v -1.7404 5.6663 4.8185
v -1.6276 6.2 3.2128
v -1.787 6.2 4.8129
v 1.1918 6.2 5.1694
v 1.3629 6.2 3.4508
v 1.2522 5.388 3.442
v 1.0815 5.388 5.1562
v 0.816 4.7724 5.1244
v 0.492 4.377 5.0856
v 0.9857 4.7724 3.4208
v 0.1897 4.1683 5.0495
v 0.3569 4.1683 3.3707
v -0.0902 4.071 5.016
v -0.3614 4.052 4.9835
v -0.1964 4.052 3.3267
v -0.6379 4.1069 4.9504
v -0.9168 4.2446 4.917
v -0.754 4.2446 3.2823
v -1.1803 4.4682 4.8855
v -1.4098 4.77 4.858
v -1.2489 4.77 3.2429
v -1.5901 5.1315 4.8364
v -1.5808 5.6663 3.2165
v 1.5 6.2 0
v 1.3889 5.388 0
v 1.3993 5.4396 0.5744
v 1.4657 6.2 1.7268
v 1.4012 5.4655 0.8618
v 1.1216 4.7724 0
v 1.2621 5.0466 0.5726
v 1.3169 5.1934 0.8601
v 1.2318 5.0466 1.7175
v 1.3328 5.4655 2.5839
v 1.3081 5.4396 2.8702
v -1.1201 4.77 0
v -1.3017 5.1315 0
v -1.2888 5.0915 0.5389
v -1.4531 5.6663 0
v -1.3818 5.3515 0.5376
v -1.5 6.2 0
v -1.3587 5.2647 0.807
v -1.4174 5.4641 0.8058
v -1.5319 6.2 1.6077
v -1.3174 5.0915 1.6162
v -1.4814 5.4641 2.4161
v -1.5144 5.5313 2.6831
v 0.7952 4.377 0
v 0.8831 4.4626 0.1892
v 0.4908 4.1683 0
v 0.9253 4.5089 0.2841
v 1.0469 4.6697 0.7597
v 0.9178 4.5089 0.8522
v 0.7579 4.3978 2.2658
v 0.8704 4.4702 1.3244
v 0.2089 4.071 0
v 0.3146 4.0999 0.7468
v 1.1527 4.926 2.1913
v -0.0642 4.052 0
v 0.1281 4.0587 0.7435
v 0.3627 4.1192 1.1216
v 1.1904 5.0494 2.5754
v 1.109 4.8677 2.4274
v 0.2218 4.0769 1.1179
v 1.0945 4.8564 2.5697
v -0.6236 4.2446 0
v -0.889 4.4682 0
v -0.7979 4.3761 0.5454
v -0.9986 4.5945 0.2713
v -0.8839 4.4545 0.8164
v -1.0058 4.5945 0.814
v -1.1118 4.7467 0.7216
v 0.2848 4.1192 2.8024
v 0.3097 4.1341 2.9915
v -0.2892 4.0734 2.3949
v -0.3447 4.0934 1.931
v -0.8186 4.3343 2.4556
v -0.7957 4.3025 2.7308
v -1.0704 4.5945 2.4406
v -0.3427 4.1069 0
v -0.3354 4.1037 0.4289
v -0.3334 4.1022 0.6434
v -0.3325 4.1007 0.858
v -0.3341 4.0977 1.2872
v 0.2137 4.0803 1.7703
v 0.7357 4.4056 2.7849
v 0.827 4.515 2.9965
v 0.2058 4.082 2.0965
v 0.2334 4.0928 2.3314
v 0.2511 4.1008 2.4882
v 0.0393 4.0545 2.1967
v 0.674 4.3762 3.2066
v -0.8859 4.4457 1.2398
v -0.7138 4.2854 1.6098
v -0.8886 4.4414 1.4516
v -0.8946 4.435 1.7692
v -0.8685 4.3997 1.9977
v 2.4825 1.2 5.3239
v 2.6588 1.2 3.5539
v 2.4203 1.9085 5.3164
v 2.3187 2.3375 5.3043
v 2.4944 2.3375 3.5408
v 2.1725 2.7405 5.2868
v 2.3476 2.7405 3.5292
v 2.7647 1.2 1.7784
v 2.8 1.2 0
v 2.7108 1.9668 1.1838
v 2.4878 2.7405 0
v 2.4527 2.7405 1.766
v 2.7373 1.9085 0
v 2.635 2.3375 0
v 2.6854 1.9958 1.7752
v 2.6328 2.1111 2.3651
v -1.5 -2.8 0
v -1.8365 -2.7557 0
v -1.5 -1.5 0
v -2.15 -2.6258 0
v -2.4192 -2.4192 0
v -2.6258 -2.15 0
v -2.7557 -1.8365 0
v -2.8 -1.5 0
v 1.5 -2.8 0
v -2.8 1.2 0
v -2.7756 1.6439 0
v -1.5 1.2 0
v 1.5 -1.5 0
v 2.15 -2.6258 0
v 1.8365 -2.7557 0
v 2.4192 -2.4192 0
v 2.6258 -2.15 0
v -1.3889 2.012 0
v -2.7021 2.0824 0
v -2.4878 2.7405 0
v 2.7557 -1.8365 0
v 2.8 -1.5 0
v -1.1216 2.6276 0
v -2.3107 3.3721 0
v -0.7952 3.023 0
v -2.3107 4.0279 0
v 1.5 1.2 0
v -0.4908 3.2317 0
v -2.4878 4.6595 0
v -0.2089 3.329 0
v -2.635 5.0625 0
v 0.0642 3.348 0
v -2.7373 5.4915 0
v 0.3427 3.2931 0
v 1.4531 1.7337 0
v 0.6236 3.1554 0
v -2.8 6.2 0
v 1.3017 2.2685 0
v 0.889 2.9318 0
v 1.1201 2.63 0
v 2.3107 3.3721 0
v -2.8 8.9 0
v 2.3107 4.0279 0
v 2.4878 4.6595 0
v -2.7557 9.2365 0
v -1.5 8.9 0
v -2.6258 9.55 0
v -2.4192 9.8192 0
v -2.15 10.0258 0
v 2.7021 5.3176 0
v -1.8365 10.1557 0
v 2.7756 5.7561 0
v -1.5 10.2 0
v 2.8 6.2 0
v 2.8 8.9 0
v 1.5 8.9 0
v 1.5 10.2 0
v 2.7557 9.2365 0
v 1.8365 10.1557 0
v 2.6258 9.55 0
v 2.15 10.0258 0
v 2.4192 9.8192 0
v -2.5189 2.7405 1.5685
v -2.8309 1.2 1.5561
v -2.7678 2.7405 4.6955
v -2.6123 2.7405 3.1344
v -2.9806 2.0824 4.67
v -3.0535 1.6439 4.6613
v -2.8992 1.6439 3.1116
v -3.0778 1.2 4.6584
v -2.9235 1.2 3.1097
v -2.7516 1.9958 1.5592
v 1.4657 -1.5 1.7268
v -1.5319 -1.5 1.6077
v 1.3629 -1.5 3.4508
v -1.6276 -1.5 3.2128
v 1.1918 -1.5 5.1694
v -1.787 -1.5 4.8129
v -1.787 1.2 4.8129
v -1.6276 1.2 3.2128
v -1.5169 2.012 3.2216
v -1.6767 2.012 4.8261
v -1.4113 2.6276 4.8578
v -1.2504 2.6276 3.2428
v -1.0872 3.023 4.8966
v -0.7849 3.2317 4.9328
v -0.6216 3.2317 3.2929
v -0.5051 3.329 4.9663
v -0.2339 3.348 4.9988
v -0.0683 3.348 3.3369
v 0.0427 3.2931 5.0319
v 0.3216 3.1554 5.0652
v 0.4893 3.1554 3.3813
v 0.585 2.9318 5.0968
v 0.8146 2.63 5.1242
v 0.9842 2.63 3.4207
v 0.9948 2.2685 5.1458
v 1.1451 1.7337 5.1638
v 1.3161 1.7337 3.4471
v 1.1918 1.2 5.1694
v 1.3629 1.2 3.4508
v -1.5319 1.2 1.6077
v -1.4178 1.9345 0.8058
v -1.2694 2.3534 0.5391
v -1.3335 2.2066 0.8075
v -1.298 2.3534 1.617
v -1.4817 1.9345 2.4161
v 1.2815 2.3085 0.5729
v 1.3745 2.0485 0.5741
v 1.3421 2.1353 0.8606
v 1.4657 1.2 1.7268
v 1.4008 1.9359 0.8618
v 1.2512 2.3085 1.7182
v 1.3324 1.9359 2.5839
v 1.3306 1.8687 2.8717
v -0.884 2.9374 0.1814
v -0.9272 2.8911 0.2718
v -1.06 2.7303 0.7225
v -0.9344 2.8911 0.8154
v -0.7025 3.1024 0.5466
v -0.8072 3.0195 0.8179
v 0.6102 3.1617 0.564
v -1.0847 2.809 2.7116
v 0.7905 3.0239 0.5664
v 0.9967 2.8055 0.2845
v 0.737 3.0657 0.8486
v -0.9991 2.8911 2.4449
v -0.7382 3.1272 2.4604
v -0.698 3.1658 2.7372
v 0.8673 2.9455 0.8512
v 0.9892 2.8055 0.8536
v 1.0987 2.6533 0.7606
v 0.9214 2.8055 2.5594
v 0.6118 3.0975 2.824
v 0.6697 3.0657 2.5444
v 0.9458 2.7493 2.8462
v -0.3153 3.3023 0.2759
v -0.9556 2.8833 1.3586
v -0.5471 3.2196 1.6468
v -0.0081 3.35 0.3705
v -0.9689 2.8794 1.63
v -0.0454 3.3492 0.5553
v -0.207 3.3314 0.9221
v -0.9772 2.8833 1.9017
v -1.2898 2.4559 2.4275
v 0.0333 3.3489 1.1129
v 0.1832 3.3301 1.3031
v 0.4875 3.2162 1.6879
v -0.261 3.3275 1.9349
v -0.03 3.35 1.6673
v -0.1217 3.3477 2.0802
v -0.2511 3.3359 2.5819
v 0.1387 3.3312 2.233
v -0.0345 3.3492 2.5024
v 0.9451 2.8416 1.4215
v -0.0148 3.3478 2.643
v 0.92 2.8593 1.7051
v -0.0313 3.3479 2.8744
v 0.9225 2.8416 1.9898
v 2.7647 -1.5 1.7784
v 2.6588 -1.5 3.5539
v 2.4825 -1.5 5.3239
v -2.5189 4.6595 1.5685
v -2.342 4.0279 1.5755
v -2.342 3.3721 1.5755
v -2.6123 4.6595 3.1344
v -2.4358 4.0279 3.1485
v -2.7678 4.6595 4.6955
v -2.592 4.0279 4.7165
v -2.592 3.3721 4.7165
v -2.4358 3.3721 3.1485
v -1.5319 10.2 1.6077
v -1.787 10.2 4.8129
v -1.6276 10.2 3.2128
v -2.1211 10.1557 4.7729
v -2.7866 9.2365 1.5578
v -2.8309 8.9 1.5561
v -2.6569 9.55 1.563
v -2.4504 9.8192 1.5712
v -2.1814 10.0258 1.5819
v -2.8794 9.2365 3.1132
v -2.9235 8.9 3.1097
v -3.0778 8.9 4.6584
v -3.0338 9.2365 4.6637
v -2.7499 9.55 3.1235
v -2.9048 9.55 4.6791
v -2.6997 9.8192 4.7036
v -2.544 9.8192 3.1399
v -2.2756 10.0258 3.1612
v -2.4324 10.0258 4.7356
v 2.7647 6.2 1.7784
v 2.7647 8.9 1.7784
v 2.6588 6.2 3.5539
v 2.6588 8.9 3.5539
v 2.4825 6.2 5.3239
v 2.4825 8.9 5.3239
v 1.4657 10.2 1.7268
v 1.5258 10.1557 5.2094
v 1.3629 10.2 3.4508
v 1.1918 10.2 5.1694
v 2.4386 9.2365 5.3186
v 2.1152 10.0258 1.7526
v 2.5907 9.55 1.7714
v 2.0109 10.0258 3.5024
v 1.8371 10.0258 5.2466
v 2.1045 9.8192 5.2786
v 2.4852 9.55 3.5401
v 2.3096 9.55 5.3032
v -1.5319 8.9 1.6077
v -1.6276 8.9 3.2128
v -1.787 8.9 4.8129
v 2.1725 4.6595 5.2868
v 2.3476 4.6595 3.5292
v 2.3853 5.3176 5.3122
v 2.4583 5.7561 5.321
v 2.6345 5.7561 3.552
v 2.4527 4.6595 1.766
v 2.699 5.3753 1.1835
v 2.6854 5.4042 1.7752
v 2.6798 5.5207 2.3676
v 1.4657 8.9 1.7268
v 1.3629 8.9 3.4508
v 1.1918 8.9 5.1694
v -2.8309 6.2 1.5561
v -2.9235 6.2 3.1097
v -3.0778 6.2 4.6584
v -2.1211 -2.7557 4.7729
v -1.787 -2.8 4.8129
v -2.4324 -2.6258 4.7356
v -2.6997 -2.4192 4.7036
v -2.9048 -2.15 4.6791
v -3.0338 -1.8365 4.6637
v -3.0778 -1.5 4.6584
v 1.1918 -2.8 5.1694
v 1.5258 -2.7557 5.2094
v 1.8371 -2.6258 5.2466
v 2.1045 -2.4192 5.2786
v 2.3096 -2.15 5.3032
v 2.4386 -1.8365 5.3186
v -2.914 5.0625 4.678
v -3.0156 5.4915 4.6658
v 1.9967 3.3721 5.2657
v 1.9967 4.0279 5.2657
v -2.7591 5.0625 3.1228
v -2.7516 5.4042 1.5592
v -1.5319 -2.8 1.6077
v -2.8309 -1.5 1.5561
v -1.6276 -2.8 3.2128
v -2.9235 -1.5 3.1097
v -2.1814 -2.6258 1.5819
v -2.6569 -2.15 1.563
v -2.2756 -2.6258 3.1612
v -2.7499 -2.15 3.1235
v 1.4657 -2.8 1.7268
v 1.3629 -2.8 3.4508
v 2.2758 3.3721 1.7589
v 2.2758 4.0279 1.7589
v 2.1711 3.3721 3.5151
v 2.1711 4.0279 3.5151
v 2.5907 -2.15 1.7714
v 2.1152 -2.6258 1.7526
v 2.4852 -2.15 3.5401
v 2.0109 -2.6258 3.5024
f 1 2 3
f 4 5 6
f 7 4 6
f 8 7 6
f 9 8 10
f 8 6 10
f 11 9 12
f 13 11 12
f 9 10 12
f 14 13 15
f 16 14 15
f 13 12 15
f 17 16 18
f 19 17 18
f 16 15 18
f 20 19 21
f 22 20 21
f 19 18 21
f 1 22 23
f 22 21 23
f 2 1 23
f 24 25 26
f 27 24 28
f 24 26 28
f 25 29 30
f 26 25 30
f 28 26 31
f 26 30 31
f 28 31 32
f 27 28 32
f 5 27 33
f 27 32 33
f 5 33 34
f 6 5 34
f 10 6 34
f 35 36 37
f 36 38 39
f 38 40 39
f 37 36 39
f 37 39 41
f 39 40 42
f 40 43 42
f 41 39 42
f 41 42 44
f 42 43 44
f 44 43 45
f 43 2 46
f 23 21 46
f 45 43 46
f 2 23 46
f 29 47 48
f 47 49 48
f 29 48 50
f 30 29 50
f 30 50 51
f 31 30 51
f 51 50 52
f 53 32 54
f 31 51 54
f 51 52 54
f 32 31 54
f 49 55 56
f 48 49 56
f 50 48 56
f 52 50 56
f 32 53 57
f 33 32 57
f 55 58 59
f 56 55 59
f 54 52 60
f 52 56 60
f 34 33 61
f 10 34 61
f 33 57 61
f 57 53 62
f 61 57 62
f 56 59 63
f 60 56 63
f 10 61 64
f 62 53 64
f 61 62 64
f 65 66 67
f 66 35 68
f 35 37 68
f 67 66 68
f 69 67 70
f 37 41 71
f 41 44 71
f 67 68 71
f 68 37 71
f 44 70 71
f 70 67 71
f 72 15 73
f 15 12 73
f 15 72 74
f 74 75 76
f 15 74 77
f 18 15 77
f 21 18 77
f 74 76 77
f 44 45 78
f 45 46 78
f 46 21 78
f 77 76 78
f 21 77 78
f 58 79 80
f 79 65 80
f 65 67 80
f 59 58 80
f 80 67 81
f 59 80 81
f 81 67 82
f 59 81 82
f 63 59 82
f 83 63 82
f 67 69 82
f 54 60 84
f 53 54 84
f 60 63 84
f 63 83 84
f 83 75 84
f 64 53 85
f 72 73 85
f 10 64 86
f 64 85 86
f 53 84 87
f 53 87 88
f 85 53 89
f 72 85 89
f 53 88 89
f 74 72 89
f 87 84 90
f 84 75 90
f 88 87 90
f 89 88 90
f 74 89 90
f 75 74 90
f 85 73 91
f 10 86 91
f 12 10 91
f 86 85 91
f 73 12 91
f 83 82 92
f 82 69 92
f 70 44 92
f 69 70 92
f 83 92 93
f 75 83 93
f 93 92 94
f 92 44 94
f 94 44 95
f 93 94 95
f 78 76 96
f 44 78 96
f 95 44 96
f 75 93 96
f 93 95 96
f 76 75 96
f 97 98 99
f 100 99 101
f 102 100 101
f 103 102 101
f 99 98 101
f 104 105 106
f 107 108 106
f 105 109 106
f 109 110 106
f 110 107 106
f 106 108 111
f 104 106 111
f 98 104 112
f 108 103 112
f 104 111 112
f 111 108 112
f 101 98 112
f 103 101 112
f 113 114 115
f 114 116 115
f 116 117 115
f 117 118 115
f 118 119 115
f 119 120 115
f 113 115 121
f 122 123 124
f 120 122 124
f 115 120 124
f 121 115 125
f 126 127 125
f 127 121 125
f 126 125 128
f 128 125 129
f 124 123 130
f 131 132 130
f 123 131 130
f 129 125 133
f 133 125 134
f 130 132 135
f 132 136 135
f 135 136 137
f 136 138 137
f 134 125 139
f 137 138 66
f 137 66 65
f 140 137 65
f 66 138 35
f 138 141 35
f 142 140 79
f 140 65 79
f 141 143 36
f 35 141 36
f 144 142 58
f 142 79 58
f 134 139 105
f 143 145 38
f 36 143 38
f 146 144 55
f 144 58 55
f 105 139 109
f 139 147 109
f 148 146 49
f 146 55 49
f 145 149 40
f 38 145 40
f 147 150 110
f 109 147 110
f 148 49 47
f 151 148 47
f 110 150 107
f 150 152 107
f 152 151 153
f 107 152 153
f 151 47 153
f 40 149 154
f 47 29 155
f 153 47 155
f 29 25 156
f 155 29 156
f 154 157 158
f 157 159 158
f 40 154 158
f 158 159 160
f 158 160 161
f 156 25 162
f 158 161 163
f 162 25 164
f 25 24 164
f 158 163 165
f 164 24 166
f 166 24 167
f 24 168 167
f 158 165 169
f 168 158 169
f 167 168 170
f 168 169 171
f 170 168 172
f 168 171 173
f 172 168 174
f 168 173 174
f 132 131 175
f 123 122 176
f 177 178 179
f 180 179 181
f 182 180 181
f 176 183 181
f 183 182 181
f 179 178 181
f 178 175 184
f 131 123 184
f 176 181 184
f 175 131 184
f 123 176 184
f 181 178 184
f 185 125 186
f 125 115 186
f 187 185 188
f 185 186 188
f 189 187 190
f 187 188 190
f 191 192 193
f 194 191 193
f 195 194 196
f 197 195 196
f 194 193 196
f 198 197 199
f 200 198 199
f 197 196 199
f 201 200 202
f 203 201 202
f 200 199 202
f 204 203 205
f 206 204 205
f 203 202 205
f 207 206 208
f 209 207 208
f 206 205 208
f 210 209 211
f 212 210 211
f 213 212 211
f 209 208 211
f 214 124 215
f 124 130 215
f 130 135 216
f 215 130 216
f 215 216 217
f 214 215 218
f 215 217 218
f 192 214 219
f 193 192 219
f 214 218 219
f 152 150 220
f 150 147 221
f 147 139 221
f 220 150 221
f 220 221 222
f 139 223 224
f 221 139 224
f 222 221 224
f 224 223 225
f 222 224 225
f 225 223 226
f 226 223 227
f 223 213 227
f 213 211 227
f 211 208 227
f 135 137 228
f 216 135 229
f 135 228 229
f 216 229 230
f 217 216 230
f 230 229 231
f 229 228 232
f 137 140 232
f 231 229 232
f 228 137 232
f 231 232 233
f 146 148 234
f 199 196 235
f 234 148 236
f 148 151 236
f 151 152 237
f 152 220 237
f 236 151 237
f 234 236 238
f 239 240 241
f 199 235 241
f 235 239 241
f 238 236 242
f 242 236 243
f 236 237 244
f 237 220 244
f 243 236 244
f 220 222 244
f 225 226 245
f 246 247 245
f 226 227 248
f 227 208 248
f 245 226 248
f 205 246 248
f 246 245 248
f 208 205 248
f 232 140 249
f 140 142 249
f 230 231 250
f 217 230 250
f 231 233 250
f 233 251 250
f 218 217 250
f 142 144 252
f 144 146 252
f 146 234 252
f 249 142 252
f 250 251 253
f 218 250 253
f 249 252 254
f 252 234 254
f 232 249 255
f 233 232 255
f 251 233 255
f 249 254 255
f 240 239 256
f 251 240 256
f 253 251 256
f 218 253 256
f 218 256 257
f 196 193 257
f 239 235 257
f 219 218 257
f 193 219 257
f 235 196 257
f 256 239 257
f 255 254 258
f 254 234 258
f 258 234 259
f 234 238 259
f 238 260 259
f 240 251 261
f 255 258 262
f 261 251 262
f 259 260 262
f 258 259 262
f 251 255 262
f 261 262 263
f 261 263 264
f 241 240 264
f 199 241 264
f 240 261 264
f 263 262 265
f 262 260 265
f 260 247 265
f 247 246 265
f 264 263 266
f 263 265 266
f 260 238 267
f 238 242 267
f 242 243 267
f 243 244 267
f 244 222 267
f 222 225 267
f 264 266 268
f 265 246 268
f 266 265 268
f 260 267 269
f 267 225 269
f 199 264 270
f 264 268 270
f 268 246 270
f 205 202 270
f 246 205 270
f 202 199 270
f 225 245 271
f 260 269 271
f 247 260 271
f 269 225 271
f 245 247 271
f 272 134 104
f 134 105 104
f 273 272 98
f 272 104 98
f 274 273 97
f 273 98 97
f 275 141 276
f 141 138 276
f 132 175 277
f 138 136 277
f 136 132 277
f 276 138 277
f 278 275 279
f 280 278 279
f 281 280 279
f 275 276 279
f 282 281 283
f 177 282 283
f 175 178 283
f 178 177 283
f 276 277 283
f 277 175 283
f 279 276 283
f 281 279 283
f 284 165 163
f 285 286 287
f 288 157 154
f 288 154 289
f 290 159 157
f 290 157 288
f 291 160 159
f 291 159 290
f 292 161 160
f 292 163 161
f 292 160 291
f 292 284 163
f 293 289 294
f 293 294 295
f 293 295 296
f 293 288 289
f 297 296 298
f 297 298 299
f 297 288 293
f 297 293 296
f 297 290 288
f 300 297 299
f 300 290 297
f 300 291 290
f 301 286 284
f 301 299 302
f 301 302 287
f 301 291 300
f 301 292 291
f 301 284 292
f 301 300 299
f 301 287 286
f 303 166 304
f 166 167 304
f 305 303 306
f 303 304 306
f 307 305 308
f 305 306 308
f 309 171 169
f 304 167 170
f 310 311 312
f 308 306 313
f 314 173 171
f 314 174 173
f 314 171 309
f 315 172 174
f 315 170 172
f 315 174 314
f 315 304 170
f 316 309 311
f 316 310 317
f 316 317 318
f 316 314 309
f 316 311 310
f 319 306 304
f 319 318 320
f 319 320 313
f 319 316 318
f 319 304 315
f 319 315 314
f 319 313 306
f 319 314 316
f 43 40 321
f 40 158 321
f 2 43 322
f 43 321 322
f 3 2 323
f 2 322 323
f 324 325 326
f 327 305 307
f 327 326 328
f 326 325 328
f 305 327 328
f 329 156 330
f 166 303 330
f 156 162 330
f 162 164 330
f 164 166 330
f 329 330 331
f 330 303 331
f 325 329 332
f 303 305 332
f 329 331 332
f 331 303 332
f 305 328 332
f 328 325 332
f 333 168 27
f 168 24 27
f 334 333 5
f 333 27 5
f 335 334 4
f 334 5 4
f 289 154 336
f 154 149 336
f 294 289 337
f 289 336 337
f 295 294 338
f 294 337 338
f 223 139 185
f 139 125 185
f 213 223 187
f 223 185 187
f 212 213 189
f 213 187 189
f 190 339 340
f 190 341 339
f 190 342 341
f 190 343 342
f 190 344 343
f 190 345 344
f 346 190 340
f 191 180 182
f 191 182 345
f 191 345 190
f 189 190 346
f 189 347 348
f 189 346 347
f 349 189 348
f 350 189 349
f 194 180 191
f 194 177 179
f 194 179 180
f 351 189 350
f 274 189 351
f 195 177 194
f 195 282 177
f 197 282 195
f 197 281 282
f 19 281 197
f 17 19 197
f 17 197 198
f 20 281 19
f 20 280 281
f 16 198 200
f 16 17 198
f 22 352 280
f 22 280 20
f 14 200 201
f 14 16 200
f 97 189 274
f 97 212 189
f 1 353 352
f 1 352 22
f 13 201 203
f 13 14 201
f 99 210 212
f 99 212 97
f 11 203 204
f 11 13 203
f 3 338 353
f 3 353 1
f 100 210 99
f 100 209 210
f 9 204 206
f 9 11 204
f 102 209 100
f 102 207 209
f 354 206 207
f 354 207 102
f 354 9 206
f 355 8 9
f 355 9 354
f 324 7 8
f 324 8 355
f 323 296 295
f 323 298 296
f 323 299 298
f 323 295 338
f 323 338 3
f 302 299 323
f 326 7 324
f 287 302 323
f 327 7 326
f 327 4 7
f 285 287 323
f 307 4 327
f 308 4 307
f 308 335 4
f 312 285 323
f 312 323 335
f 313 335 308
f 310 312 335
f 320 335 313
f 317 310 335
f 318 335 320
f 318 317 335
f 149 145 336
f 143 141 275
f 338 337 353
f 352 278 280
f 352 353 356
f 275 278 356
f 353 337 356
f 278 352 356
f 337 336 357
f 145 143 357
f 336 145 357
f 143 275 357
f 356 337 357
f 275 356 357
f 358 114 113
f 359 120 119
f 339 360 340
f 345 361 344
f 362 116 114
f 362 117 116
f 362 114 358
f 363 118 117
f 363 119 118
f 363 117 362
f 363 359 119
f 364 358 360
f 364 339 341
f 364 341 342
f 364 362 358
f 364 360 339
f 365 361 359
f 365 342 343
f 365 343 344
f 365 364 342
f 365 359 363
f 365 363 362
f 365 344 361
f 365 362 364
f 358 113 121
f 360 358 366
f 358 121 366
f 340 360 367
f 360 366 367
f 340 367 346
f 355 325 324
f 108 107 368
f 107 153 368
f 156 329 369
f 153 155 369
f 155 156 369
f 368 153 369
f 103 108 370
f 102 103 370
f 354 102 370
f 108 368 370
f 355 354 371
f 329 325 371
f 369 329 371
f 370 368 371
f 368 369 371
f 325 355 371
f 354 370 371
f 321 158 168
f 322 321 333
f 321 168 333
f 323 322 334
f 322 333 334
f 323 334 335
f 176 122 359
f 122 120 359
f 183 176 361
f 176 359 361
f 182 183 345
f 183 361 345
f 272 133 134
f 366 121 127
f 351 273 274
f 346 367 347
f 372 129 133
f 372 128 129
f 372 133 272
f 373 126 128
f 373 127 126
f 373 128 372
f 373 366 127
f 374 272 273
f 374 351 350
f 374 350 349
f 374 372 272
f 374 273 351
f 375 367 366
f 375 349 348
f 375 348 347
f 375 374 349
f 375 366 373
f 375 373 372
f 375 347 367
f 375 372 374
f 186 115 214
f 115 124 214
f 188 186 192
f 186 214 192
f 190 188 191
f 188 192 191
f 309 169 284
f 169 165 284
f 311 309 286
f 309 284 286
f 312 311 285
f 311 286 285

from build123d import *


with BuildPart() as part:
    # Sweep2: sweep along a path in Sketch12
    with BuildLine(Plane(origin=(0, 0, 0), x_dir=(1, 0, 0), z_dir=(0, 1, 0))) as sweep2_path:
        ThreePointArc((0, 0), (-0.074470784, -2.5), (-0.297619048, -4.99113443))
    # Sketch2 → Sweep2 (sweep)
    with BuildSketch(Plane.XY):
        with BuildLine():
            Line((-1.5, -2.8), (1.5, -2.8))
            ThreePointArc((1.5, -2.8), (2.419238816, -2.419238816), (2.8, -1.5))
            Line((2.8, -1.5), (2.8, 1.2))
            add(Edge.make_bspline(
                [(2.8, 1.2), (2.8, 2.022141475), (2.487772802, 2.74054726)],
                knots=[1.570796327, 1.570796327, 1.570796327, 2.078583583, 2.078583583, 2.078583583], degree=2, weights=[1, 0.967941781, 1]))
            ThreePointArc((2.487772802, 2.74054726), (2.288291027, 3.7), (2.487772802, 4.65945274))
            add(Edge.make_bspline(
                [(2.487772802, 4.65945274), (2.8, 5.377858525), (2.8, 6.2)],
                knots=[1.06300907, 1.06300907, 1.06300907, 1.570796327, 1.570796327, 1.570796327], degree=2, weights=[1, 0.967941781, 1]))
            Line((2.8, 6.2), (2.8, 8.9))
            ThreePointArc((2.8, 8.9), (2.419238816, 9.819238816), (1.5, 10.2))
            Line((1.5, 10.2), (-1.5, 10.2))
            ThreePointArc((-1.5, 10.2), (-2.419238816, 9.819238816), (-2.8, 8.9))
            Line((-2.8, 8.9), (-2.8, 6.2))
            add(Edge.make_bspline(
                [(-2.8, 6.2), (-2.8, 5.377858525), (-2.487772802, 4.65945274)],
                knots=[4.71238898, 4.71238898, 4.71238898, 5.220176237, 5.220176237, 5.220176237], degree=2, weights=[1, 0.967941781, 1]))
            ThreePointArc((-2.487772802, 4.65945274), (-2.288291027, 3.7), (-2.487772802, 2.74054726))
            add(Edge.make_bspline(
                [(-2.487772802, 2.74054726), (-2.8, 2.022141475), (-2.8, 1.2)],
                knots=[4.204601724, 4.204601724, 4.204601724, 4.71238898, 4.71238898, 4.71238898], degree=2, weights=[1, 0.967941781, 1]))
            Line((-2.8, 1.2), (-2.8, -1.5))
            ThreePointArc((-2.8, -1.5), (-2.419238816, -2.419238816), (-1.5, -2.8))
        make_face()
        with BuildLine():
            Line((-1.5, -1.5), (1.5, -1.5))
            Line((1.5, -1.5), (1.5, 1.2))
            add(Edge.make_bspline(
                [(1.5, 1.2), (1.5, 3.35), (0, 3.35), (-1.5, 3.35), (-1.5, 1.2)],
                knots=[4.71238898, 4.71238898, 4.71238898, 6.283185307, 6.283185307, 7.853981634, 7.853981634, 7.853981634], degree=2, weights=[1, 0.707106781, 1, 0.707106781, 1]))
            Line((-1.5, 1.2), (-1.5, -1.5))
        make_face(mode=Mode.SUBTRACT)
        with BuildLine():
            Line((1.5, 8.9), (1.5, 6.2))
            add(Edge.make_bspline(
                [(-1.5, 6.2), (-1.5, 4.05), (0, 4.05), (1.5, 4.05), (1.5, 6.2)],
                knots=[4.71238898, 4.71238898, 4.71238898, 6.283185307, 6.283185307, 7.853981634, 7.853981634, 7.853981634], degree=2, weights=[1, 0.707106781, 1, 0.707106781, 1]))
            Line((-1.5, 6.2), (-1.5, 8.9))
            Line((-1.5, 8.9), (1.5, 8.9))
        make_face(mode=Mode.SUBTRACT)
    sweep(path=sweep2_path.line)


solid = part.part
